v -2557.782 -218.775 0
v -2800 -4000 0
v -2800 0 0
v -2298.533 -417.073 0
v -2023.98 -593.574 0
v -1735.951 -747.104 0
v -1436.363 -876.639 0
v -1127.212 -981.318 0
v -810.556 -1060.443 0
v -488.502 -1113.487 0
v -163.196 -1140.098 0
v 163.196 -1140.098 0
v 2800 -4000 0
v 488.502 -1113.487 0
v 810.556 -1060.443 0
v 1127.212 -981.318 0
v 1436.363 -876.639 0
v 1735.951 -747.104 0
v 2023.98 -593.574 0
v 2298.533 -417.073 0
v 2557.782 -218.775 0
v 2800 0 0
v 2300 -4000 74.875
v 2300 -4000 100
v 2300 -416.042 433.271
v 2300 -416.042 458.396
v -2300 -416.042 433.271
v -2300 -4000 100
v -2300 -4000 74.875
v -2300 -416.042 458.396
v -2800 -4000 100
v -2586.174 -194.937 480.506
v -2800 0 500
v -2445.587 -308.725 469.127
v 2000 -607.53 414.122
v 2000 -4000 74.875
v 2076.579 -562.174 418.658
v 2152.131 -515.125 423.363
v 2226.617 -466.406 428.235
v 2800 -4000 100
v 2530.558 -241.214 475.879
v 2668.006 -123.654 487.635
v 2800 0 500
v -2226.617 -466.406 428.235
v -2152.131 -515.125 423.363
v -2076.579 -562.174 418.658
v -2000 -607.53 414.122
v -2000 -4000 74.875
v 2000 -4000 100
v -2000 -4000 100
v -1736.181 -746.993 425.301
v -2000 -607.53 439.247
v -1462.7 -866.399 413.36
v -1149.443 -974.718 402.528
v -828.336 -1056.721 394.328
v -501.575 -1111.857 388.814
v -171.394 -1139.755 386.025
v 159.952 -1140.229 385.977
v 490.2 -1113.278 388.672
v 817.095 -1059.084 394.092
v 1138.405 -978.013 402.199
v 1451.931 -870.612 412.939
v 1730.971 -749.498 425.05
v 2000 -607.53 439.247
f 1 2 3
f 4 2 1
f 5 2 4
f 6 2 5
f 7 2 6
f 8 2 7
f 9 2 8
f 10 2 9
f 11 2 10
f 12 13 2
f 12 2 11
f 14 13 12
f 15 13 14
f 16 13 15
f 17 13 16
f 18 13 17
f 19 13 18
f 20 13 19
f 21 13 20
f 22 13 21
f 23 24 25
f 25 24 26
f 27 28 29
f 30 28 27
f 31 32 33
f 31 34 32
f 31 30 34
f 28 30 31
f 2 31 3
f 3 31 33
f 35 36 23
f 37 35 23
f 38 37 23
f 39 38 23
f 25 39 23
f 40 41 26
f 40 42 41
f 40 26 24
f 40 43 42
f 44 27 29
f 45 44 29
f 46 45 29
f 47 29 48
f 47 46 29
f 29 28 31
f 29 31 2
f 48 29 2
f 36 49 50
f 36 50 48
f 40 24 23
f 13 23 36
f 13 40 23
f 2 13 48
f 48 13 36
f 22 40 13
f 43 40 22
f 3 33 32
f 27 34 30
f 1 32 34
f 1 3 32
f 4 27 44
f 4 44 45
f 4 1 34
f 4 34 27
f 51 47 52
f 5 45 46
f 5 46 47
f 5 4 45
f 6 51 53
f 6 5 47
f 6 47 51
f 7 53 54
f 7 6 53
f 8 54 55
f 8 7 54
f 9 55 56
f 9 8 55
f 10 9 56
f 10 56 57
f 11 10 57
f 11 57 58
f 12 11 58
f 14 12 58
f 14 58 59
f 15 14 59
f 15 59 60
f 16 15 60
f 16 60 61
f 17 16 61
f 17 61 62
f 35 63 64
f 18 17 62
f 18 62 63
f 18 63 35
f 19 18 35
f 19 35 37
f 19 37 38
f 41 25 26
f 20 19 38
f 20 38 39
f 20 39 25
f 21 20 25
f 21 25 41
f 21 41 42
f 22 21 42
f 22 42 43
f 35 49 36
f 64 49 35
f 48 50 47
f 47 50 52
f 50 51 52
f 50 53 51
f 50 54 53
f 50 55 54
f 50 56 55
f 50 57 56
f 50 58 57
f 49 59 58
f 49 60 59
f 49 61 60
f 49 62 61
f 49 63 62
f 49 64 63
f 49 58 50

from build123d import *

# Parameters (mm, degrees)
F1_DEPTH = 2800
F2_R     = 4000
F3_DEPTH = 500
F4_W     = 300
F4_H     = 4000
F5_DEPTH = 25


with BuildPart() as f1:
    # F0 (on Right) → F1 (new body, symmetric)
    with BuildSketch(Plane.YZ):
        Polygon((-4000, 0), (0, 0), (0, 500), (-4000, 100), align=None)
    extrude(amount=F1_DEPTH, both=True)

    # F2 (on Top) → F3 (cut)
    with BuildSketch(Plane.XY):
        with Locations((0, 2856.5713714171)):
            Circle(F2_R)
    extrude(amount=F3_DEPTH, mode=Mode.SUBTRACT)

    # F4 (on face) → F5 (cut)
    with BuildSketch(Plane(origin=(0, -49.504950495, 495.0495049505), x_dir=(1, 0, 0), z_dir=(0, -0.099503719, 0.9950371902))):
        with Locations((-2150, -2368.3654400909)):
            Rectangle(F4_W, F4_H)
        with Locations((2150, -2368.3654400909)):
            Rectangle(F4_W, F4_H)
    extrude(amount=-F5_DEPTH, mode=Mode.SUBTRACT)


solid = f1.part
